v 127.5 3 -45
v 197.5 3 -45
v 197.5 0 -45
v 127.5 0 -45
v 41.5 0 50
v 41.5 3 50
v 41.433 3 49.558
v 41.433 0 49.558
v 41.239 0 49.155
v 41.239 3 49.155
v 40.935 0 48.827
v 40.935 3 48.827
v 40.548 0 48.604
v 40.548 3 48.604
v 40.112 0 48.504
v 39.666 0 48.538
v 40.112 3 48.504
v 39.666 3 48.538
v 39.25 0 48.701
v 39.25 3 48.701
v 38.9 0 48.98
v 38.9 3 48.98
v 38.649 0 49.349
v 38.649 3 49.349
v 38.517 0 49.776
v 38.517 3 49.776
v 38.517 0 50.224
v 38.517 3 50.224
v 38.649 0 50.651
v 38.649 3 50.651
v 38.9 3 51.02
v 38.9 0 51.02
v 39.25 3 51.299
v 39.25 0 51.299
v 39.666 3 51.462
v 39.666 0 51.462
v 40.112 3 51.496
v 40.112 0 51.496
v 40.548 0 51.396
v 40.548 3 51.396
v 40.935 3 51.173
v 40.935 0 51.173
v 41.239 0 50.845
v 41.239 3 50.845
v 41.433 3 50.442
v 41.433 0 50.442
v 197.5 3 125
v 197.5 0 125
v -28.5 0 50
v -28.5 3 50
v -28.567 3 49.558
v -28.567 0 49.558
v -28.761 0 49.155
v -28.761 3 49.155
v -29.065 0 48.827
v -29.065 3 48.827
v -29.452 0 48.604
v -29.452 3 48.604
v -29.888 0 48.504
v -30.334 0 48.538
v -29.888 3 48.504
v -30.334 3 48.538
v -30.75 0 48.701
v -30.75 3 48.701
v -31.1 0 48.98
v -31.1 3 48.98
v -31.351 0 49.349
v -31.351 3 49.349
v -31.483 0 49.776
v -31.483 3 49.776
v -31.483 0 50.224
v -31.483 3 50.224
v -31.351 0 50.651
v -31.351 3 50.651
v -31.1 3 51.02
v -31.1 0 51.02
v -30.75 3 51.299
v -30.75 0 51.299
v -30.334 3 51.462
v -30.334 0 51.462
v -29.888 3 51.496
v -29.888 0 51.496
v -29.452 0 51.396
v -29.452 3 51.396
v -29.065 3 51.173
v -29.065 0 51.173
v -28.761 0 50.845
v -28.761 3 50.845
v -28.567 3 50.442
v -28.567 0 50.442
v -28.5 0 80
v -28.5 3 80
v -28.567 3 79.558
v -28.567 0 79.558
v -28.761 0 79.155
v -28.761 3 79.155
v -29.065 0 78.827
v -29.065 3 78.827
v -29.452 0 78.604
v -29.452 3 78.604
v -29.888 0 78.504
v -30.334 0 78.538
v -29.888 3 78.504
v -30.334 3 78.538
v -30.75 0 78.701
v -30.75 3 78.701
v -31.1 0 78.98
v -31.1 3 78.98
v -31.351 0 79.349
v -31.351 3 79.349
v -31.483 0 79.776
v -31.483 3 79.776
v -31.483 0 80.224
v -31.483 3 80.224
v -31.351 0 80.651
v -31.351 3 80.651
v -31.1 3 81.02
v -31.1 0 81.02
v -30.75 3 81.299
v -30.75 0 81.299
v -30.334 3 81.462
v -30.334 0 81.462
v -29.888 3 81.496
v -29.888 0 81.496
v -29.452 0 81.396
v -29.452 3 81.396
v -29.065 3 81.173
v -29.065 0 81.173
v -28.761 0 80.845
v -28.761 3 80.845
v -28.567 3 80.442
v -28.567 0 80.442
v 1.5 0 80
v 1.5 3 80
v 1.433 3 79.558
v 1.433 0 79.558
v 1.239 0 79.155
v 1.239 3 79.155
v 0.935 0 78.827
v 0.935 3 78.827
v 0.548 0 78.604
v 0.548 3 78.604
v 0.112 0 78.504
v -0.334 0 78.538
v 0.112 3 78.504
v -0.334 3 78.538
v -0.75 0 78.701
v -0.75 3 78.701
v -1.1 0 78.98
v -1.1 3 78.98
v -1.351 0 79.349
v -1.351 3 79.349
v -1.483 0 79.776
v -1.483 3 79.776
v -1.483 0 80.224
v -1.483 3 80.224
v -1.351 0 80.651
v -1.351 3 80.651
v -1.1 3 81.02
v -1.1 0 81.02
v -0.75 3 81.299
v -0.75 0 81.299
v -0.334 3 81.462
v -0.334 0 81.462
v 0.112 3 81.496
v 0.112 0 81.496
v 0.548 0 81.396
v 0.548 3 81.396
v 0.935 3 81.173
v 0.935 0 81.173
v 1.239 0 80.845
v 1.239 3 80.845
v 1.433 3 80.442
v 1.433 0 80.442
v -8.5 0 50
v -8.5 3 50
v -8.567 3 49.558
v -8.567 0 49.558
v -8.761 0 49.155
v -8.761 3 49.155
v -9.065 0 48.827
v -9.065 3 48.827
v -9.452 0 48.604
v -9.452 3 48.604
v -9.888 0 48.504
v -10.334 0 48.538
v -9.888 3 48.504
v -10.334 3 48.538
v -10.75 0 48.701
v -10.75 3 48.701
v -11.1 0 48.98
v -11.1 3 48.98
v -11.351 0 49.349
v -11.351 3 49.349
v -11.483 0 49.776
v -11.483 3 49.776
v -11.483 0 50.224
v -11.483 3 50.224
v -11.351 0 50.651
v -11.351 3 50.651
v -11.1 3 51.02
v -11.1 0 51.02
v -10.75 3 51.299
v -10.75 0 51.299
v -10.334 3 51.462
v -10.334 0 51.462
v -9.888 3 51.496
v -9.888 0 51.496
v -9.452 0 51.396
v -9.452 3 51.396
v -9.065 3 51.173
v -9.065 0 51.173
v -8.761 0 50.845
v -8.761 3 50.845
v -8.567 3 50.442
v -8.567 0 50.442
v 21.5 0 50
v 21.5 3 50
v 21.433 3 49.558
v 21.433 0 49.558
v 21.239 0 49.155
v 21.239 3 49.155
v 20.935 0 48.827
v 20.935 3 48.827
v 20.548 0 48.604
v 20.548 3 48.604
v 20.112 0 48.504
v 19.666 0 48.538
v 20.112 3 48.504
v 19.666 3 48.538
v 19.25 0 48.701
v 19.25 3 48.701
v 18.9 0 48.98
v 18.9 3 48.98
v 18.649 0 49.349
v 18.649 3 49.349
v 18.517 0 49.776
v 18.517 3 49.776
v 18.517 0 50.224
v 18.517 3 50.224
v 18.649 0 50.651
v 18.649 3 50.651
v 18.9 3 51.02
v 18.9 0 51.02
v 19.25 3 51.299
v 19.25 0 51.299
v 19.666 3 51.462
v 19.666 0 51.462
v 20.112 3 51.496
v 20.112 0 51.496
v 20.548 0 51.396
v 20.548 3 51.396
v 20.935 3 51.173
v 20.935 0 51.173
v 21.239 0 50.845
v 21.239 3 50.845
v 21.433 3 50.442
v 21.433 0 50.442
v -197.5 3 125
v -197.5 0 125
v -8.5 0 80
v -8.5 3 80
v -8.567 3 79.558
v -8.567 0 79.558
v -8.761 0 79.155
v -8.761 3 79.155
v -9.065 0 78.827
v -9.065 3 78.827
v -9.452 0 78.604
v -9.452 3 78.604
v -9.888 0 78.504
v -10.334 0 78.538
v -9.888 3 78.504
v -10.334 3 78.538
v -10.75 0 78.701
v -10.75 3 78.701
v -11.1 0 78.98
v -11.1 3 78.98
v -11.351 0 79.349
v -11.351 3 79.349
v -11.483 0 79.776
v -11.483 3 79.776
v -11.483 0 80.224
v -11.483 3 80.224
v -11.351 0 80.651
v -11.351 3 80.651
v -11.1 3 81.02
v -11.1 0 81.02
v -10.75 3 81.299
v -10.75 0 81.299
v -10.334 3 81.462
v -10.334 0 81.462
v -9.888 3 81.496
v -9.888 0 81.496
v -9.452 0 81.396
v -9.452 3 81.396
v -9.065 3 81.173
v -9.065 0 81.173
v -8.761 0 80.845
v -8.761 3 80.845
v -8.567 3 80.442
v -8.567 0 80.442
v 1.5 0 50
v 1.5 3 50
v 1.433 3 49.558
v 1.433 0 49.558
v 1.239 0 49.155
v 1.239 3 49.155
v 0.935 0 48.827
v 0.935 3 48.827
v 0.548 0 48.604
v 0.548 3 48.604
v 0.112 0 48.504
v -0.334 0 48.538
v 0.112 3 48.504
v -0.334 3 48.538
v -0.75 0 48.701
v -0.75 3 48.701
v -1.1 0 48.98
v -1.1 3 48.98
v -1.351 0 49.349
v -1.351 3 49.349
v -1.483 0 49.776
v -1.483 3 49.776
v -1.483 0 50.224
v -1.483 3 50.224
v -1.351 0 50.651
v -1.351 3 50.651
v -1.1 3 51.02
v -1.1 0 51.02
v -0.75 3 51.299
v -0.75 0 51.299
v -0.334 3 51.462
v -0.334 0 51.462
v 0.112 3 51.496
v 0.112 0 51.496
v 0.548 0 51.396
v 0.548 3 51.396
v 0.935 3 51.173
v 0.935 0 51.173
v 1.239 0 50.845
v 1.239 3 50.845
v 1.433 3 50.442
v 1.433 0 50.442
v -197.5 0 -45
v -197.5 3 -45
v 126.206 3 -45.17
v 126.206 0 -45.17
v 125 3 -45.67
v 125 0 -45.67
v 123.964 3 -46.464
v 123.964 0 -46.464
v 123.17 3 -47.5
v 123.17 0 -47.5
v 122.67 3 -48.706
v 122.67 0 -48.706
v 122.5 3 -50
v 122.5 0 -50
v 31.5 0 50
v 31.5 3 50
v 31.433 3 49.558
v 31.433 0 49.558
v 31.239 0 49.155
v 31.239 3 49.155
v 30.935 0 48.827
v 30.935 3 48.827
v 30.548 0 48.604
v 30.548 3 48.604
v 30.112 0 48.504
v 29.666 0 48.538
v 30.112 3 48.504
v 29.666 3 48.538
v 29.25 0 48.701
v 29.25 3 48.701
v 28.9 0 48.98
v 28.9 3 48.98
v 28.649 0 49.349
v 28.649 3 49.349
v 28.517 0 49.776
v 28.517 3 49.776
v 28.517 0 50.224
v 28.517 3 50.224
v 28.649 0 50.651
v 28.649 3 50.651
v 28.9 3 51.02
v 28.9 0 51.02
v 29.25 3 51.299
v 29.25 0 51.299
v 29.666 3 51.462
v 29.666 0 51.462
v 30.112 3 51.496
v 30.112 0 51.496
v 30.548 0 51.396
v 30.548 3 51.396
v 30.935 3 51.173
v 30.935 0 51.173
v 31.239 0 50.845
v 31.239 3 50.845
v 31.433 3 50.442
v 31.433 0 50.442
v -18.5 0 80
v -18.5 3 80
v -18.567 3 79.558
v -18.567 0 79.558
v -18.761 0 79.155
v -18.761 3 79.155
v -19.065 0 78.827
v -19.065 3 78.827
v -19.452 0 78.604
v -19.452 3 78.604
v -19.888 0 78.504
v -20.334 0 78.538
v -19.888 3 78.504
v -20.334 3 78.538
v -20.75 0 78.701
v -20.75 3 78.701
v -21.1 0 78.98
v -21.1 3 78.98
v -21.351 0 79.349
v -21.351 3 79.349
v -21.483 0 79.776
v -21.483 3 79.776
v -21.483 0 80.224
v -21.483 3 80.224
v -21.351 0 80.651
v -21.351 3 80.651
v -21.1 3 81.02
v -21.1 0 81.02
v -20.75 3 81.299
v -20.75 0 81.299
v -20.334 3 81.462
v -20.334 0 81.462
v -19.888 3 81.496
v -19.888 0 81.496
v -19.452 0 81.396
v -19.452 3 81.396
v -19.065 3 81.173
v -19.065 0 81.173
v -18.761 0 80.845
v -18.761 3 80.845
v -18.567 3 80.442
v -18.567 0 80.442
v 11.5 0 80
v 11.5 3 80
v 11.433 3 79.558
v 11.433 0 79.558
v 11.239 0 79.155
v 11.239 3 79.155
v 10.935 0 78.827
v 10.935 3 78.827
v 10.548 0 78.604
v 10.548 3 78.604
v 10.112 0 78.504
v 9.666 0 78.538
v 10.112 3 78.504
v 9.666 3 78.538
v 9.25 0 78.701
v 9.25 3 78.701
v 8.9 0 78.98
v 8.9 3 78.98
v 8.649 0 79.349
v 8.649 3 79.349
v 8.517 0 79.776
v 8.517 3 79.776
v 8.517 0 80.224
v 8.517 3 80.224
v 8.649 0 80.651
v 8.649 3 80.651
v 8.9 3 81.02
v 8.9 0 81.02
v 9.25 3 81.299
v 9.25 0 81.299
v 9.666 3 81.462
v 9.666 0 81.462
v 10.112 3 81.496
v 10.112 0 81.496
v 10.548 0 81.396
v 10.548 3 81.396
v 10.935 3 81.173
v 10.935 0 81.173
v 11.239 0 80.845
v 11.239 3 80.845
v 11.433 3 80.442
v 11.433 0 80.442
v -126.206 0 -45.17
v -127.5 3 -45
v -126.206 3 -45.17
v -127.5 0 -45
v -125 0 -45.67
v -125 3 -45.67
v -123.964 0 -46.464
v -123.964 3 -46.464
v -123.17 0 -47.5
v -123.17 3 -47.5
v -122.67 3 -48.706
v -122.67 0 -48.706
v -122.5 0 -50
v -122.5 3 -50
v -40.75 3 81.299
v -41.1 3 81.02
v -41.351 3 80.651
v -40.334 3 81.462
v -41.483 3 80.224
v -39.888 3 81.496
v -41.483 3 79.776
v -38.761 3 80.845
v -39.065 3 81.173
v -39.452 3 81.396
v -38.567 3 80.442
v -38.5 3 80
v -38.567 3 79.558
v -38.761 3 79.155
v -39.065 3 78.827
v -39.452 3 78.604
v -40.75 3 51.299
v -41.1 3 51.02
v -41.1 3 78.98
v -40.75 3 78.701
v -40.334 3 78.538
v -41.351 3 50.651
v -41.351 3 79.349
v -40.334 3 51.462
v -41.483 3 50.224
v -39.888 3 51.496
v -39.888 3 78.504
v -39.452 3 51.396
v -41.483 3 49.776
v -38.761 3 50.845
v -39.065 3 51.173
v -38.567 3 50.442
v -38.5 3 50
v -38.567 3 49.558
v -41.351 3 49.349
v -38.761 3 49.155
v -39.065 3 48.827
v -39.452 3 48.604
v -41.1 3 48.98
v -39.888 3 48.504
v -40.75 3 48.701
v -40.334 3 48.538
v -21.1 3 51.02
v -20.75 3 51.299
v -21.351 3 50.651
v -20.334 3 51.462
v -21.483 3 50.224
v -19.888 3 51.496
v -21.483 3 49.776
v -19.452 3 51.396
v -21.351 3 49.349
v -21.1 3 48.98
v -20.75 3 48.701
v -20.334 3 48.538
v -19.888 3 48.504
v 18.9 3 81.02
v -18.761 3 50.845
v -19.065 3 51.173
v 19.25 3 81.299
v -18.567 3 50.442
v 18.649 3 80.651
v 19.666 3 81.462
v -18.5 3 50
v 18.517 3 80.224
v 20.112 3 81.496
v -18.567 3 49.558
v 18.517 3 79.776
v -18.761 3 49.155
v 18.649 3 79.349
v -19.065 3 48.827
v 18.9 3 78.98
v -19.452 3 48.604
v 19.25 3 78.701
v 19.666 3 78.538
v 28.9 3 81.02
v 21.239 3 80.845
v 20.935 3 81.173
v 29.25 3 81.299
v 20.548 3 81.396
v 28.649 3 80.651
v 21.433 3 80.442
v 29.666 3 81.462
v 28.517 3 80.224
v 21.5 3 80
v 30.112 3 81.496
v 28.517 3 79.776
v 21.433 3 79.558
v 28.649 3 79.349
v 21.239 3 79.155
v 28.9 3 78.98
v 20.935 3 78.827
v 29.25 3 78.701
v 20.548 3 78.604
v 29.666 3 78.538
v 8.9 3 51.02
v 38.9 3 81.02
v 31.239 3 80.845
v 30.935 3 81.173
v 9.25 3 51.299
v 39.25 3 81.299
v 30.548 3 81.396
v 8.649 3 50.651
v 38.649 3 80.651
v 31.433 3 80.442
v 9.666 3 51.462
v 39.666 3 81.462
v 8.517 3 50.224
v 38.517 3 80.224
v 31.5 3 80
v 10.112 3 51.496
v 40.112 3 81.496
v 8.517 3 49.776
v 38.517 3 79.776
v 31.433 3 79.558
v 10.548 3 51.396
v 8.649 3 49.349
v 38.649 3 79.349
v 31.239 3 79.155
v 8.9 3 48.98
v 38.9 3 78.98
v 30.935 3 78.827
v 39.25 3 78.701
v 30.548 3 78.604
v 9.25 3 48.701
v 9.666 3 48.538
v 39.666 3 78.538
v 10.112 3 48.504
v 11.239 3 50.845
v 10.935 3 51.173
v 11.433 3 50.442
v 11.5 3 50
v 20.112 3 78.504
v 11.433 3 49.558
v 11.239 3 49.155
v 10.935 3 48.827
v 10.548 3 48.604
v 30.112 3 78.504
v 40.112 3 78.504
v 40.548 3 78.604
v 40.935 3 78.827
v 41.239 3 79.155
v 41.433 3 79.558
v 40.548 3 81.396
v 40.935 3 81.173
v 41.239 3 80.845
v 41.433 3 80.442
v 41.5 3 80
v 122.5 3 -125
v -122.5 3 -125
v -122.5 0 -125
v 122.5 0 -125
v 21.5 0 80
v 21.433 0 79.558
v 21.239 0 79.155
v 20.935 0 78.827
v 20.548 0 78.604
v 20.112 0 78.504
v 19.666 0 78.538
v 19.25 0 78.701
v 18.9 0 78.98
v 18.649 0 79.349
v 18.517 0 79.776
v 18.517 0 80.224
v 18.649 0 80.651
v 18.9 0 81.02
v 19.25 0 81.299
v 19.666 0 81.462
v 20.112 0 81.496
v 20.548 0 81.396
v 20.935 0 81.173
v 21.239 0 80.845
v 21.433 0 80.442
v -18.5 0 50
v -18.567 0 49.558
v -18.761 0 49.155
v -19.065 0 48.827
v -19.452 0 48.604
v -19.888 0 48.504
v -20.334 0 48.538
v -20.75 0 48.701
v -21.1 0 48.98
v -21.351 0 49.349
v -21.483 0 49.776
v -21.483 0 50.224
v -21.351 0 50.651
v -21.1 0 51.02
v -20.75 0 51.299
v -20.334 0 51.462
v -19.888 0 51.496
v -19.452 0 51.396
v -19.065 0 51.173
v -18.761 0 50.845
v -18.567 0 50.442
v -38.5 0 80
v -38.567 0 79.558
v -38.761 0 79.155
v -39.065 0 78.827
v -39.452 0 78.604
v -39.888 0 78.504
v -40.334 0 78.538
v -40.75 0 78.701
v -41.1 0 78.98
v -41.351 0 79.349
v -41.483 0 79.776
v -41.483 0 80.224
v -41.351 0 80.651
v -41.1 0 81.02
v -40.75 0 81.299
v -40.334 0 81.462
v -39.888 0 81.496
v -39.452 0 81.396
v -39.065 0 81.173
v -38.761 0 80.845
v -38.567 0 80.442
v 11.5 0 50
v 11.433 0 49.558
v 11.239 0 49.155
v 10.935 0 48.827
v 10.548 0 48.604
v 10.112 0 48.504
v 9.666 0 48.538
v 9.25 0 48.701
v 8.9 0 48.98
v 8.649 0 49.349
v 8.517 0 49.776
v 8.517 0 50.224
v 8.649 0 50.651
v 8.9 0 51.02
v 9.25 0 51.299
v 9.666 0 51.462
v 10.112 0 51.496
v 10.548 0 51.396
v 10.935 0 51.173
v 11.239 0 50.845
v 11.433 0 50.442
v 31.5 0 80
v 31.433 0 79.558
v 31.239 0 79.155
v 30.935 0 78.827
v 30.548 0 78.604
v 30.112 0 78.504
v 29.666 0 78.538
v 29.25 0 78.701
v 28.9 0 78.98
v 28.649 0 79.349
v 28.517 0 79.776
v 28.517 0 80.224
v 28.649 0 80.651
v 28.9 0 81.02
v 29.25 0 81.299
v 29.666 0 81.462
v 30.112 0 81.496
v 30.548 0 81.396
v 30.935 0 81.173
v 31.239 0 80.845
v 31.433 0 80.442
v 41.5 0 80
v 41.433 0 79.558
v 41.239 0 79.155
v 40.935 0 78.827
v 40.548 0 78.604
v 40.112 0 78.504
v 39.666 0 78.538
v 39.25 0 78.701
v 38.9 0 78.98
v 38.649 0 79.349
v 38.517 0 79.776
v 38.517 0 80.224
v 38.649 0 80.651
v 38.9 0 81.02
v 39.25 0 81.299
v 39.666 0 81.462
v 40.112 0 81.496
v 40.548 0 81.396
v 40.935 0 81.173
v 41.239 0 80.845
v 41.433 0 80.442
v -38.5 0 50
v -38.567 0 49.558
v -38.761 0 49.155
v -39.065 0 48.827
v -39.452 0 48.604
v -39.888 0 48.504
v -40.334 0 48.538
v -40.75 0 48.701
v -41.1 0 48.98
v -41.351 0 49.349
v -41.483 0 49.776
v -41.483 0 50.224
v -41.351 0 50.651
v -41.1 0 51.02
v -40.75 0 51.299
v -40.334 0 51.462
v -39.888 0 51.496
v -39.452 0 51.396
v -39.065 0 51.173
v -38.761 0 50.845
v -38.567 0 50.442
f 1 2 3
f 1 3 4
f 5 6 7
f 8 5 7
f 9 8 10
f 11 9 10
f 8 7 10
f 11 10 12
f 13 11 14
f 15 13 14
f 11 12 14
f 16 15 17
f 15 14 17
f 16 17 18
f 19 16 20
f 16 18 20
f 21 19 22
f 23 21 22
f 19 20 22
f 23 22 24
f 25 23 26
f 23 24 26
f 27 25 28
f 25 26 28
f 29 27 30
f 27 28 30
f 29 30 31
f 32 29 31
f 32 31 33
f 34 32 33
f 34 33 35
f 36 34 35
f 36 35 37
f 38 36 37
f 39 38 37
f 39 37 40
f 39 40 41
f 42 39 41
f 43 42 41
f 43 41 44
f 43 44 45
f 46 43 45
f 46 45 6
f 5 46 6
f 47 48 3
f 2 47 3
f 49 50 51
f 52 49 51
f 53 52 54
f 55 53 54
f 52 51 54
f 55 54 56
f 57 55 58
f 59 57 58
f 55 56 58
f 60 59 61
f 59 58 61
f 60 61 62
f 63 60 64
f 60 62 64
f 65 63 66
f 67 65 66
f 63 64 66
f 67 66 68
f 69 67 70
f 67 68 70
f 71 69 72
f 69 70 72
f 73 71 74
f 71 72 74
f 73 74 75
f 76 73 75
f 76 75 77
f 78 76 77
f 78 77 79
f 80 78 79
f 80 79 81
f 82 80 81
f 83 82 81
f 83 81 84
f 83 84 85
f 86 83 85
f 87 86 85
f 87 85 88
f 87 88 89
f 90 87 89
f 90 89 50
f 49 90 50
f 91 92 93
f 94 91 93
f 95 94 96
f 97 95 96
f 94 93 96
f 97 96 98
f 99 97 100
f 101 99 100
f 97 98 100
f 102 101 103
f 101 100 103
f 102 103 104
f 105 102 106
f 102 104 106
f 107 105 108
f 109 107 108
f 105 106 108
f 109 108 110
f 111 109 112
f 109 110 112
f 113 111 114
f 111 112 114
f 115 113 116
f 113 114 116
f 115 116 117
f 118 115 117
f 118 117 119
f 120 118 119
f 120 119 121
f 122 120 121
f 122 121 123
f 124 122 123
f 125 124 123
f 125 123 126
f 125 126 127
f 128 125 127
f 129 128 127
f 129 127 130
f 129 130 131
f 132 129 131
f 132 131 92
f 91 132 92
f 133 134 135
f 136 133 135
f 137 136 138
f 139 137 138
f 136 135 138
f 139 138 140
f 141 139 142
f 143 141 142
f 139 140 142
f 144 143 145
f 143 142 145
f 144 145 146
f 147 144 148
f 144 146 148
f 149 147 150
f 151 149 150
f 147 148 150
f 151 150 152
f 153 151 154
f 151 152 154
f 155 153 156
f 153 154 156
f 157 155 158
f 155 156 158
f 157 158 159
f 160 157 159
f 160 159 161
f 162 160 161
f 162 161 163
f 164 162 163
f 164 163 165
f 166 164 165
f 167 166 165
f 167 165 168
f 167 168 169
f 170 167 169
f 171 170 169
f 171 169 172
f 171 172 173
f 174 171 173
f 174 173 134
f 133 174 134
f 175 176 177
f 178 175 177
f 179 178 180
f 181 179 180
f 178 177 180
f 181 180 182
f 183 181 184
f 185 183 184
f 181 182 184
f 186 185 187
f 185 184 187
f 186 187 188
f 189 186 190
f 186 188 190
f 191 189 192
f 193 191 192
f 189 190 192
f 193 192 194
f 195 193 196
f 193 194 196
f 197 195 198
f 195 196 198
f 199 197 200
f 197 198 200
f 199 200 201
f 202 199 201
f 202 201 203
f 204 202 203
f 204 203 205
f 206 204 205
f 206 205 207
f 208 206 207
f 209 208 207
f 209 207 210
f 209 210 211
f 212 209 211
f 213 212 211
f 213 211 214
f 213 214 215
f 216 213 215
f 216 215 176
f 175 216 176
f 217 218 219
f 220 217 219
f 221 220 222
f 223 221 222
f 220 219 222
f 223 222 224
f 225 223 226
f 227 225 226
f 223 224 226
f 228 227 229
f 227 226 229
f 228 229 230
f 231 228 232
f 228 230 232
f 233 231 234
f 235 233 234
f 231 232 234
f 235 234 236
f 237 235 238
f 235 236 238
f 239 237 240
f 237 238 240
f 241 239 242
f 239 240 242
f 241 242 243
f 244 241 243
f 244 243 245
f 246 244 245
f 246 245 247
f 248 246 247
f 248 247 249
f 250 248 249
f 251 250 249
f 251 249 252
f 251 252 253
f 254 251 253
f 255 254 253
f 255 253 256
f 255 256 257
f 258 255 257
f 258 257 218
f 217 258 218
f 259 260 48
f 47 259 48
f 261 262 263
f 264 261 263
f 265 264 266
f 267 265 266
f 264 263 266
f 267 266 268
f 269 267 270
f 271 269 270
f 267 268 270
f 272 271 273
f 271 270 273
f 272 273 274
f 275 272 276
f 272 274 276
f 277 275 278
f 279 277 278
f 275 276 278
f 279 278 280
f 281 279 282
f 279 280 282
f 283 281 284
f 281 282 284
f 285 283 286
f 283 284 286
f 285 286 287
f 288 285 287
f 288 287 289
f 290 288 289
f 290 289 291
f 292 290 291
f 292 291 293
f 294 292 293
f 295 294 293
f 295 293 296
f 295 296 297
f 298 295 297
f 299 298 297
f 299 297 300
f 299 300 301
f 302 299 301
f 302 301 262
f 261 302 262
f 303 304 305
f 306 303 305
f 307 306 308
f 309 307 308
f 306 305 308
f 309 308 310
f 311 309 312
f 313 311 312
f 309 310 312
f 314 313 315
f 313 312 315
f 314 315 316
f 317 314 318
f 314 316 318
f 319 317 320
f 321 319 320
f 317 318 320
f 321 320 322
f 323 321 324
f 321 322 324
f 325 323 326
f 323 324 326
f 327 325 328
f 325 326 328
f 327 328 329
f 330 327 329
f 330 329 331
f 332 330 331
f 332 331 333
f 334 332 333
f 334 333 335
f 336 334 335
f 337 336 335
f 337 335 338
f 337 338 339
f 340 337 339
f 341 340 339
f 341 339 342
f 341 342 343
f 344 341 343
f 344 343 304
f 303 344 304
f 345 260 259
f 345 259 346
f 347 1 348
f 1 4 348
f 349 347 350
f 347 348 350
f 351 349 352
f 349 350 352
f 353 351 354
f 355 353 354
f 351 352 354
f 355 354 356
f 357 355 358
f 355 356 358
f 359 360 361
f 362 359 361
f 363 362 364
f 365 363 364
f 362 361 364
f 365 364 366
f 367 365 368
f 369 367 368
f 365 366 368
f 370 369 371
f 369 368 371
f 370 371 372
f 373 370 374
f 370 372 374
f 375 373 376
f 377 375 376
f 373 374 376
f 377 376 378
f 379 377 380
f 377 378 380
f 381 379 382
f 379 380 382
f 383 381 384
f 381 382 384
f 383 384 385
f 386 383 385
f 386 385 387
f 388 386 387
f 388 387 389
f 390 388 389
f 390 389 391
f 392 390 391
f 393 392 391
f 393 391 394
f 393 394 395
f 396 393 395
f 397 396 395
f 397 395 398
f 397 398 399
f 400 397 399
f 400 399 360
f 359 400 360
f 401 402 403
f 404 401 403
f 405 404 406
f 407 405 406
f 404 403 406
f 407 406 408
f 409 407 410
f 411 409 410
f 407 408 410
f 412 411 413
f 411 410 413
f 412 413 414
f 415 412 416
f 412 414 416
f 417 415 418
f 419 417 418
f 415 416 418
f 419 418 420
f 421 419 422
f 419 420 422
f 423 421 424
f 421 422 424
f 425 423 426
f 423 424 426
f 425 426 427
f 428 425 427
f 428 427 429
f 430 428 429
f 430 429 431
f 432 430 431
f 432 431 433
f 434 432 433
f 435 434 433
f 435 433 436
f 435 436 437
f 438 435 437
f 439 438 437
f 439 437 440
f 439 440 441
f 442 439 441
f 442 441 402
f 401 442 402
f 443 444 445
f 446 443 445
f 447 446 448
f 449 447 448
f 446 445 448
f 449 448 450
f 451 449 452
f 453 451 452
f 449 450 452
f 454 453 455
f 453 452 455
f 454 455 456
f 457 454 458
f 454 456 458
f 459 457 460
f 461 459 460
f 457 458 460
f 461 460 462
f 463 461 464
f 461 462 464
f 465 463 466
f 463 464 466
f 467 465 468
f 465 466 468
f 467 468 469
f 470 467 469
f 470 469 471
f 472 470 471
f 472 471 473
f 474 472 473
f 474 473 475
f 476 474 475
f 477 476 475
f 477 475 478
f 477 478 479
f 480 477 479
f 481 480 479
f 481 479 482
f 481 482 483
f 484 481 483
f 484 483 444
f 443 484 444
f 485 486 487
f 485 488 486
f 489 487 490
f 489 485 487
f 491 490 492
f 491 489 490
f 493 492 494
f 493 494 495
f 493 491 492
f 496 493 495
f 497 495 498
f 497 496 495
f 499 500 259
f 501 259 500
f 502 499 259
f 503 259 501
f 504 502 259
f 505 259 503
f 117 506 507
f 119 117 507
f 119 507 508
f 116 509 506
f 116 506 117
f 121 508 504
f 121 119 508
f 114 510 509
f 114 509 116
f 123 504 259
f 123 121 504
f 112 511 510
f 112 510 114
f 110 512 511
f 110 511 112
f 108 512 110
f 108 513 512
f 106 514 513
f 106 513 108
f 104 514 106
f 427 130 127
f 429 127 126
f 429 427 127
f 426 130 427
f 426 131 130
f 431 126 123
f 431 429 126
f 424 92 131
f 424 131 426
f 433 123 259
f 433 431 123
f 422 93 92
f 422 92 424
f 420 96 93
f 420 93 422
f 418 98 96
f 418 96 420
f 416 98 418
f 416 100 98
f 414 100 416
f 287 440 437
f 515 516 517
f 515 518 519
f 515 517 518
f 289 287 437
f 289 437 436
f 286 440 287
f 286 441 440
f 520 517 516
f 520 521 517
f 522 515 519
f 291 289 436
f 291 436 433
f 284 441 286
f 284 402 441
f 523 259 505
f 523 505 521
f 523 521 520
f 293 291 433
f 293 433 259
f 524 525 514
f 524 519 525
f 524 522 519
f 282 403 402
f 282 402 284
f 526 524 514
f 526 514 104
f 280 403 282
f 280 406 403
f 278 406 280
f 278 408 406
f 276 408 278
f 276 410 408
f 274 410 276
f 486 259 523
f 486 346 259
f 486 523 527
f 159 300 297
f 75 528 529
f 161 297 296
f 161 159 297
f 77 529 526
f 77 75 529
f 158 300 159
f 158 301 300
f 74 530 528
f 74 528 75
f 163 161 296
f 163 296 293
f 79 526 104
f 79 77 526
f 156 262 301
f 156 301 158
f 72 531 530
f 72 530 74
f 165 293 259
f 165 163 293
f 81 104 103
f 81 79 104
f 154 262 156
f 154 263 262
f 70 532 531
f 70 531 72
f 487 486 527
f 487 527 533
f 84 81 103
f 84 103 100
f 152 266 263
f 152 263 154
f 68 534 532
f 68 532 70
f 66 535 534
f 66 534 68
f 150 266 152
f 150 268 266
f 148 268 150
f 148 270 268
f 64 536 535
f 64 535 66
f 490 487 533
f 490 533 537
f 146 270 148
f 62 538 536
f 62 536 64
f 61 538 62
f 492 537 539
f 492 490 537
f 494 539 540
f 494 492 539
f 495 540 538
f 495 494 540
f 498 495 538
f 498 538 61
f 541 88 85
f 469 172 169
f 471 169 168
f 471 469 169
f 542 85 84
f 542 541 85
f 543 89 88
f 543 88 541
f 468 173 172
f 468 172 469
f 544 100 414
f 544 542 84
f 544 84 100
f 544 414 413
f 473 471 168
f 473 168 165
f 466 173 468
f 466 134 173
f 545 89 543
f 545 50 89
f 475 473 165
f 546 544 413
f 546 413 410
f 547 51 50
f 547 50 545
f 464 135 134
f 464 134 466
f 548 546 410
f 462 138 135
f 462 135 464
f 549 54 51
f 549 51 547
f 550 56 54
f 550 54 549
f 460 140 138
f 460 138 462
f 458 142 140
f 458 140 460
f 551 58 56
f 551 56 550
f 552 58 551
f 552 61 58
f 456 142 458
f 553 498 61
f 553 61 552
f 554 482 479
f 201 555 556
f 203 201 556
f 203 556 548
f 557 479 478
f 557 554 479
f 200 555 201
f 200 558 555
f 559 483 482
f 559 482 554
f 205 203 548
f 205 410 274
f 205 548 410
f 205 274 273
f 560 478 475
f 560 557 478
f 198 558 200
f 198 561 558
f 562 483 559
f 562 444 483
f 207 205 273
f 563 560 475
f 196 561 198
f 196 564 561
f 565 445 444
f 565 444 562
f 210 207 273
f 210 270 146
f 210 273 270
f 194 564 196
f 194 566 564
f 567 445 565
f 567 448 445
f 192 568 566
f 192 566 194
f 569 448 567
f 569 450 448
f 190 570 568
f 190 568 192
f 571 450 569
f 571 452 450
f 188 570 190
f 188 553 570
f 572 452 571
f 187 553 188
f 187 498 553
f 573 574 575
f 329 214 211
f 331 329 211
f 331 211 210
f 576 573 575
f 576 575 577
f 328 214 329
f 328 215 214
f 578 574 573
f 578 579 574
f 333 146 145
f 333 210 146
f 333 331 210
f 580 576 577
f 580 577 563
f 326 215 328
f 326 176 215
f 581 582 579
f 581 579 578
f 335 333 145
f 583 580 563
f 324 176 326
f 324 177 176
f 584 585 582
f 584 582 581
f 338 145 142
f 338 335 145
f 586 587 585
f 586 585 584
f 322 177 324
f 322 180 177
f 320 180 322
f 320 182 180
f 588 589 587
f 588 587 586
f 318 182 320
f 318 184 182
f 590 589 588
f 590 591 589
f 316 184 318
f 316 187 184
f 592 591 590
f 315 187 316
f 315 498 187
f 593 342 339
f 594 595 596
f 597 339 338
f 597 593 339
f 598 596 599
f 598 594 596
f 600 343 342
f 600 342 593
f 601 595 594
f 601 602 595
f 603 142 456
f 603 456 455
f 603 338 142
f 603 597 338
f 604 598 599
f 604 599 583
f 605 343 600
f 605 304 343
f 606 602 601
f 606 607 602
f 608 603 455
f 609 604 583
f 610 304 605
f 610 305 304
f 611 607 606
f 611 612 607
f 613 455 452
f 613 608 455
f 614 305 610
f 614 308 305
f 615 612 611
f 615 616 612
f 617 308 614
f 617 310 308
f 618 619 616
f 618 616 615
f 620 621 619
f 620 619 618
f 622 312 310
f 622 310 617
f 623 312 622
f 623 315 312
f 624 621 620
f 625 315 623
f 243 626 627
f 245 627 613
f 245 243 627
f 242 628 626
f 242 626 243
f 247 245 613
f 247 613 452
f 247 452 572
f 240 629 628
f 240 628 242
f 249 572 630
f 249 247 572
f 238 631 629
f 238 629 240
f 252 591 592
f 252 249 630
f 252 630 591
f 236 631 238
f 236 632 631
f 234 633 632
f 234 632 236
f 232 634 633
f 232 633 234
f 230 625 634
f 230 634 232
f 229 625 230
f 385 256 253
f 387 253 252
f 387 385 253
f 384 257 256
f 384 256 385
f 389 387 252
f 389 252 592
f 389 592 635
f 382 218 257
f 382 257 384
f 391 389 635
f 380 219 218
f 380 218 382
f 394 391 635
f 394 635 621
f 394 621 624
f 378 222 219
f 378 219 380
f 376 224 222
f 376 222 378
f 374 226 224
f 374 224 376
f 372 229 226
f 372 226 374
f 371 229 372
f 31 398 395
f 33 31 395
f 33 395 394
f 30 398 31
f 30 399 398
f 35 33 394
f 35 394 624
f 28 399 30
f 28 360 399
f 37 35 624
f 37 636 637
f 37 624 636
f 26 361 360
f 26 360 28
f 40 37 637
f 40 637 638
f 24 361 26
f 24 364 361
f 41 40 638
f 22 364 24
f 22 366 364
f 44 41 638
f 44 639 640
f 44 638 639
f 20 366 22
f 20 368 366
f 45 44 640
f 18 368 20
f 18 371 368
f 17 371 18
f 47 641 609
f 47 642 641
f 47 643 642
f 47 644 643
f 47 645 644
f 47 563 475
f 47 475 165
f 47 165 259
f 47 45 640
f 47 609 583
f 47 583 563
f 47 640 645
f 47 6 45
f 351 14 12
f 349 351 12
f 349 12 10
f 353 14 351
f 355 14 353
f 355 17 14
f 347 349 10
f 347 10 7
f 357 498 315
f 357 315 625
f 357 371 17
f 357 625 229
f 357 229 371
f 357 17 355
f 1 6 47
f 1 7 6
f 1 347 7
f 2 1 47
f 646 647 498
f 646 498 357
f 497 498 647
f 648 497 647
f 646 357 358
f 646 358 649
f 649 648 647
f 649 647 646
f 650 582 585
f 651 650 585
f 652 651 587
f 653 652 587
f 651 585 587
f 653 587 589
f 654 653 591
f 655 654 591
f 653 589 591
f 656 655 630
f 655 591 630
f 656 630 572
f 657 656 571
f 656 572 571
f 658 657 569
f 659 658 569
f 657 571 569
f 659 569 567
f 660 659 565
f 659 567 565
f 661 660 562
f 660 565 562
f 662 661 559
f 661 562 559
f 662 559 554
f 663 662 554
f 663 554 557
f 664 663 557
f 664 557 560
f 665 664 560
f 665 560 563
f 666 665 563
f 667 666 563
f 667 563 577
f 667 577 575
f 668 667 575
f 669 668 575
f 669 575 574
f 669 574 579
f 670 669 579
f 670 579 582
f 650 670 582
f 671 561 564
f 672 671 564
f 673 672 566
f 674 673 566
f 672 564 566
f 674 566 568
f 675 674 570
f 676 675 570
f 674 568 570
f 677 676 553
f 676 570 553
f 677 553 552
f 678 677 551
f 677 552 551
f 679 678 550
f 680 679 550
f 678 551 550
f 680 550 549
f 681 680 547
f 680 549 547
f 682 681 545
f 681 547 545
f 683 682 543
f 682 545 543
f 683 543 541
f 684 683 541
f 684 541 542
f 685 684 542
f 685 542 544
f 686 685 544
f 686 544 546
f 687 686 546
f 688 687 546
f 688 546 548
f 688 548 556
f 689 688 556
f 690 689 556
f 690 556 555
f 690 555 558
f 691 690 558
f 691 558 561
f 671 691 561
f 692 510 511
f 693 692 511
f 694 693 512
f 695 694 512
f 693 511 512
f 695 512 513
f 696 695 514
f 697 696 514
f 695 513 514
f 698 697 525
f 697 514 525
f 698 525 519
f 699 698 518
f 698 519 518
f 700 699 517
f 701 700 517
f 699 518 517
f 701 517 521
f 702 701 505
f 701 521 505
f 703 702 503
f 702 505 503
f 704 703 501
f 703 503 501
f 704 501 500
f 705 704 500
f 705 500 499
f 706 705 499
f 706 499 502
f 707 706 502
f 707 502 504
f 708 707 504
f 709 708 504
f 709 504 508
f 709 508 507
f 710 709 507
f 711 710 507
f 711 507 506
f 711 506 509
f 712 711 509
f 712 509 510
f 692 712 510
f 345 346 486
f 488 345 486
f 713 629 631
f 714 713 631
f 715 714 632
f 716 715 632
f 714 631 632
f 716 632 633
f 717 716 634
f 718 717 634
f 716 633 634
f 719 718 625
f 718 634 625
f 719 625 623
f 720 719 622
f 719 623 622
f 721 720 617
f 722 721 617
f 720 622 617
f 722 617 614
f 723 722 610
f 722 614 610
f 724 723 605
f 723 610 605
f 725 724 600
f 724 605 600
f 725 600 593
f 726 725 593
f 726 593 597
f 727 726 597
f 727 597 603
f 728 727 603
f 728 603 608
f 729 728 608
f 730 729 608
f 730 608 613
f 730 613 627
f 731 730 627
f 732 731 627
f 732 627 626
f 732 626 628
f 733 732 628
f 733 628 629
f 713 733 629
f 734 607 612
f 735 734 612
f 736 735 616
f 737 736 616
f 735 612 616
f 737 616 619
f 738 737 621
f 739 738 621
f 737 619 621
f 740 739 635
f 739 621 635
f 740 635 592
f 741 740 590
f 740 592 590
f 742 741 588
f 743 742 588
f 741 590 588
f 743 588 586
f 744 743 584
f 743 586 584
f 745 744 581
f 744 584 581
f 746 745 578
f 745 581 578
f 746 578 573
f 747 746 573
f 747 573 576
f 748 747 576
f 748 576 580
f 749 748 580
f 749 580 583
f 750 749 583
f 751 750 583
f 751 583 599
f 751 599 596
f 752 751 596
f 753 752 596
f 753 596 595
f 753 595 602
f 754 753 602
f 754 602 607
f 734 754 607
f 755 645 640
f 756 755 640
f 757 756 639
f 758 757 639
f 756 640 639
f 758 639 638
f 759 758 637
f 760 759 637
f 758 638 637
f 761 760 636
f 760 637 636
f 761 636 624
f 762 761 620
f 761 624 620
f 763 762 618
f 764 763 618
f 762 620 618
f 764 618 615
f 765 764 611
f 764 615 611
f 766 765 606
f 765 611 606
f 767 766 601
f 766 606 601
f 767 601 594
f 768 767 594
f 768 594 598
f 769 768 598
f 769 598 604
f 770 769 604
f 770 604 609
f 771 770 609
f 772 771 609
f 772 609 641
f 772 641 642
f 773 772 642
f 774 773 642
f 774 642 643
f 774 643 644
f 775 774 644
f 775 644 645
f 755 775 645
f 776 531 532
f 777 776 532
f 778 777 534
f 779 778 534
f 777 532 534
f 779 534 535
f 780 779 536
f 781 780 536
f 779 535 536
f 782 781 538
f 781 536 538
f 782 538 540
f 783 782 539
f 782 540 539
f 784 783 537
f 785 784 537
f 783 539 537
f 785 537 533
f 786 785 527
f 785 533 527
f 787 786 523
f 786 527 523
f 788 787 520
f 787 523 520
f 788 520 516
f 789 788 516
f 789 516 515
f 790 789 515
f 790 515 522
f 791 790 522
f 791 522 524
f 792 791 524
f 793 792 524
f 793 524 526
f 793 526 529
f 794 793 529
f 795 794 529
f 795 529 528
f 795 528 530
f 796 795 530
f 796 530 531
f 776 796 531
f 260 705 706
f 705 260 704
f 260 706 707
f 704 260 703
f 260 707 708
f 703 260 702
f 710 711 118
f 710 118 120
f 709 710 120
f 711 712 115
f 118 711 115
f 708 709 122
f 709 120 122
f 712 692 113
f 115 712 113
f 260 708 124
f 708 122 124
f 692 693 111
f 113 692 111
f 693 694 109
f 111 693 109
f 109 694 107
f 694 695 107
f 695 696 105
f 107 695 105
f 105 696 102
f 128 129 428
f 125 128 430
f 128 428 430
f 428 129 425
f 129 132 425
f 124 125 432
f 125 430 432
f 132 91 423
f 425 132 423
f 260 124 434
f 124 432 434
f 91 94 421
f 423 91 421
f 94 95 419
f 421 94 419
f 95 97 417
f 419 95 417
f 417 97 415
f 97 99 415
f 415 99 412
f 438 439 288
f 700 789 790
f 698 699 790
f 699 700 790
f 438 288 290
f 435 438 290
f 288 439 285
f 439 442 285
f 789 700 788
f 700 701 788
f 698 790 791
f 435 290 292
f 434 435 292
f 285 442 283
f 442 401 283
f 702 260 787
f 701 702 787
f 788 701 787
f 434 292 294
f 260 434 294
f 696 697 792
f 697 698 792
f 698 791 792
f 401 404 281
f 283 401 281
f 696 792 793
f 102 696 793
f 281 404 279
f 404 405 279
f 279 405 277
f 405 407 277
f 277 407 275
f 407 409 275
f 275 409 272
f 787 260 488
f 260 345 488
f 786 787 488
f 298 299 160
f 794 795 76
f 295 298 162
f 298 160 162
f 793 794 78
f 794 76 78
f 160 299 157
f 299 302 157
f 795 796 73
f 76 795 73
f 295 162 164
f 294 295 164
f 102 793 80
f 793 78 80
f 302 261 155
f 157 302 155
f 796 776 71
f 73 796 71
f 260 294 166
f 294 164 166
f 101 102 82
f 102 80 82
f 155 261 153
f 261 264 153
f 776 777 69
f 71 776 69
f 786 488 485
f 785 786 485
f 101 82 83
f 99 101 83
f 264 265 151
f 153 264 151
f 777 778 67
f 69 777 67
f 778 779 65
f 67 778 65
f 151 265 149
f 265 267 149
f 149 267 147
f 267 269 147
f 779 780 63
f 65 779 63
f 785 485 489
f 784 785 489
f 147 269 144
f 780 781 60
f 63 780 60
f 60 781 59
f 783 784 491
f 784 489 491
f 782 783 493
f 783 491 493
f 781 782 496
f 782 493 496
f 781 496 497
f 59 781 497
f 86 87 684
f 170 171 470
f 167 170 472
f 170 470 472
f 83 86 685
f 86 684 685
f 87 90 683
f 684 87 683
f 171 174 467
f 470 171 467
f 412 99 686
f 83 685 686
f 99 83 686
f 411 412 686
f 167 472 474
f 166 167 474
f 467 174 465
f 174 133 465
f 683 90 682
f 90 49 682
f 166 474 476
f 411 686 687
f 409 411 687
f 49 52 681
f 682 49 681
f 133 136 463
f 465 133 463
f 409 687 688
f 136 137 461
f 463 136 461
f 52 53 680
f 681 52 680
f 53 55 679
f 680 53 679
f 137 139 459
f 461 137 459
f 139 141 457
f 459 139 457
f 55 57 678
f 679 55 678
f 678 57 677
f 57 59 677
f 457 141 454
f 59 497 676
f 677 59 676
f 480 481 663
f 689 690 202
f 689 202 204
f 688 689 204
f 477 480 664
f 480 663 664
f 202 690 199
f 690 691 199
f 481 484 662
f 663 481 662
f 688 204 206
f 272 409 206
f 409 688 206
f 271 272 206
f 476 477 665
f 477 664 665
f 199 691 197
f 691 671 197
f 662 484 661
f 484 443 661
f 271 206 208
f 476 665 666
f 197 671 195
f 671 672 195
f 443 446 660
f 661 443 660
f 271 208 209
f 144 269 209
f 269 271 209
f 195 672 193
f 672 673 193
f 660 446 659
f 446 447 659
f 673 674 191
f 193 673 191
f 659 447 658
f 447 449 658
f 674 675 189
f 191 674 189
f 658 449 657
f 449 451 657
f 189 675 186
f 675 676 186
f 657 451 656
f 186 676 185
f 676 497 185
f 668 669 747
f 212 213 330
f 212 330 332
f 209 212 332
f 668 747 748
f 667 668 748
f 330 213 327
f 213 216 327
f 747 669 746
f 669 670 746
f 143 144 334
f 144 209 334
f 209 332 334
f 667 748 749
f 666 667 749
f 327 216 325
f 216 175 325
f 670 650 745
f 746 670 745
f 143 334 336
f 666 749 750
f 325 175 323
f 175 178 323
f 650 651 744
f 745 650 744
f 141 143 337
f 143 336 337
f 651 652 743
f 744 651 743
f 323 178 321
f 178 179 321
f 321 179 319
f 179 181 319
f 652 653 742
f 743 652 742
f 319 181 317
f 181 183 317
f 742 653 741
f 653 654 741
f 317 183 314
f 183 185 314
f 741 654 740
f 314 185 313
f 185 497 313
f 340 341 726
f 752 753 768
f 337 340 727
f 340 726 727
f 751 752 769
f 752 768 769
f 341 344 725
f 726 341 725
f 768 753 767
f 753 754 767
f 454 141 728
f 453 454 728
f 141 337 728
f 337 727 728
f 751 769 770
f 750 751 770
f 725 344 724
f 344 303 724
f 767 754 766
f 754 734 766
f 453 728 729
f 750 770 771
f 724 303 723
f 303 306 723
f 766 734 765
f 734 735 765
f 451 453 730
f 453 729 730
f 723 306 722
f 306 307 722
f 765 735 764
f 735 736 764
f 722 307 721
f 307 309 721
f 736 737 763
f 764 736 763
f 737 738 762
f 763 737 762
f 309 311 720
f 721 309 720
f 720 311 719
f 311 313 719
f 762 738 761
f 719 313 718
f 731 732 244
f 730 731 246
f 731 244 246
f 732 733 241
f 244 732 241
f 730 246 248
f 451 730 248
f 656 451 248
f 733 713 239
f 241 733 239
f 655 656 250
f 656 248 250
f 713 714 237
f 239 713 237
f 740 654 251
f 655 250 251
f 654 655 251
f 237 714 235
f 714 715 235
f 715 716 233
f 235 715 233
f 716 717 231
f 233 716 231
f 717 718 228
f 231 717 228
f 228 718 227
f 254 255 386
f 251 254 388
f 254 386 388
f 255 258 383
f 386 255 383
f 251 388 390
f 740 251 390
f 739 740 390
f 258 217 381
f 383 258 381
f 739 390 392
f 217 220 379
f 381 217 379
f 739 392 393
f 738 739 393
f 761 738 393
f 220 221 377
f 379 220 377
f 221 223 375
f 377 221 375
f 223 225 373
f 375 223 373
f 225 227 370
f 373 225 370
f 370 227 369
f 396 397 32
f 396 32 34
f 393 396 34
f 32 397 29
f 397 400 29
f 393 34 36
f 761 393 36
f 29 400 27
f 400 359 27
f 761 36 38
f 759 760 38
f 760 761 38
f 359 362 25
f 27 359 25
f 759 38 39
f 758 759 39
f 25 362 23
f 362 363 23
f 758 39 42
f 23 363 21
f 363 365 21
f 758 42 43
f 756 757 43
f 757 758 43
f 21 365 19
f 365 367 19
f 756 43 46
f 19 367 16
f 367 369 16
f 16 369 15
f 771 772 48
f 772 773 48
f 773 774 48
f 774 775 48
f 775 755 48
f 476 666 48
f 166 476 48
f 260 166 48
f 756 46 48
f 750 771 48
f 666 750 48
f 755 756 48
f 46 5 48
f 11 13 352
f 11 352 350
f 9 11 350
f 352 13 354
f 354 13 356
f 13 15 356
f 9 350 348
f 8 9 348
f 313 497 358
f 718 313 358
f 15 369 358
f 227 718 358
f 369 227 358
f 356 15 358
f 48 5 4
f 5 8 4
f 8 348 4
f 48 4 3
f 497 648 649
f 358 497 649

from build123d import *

# Parameters (mm, degrees)
SKETCH1_W           = 395
SKETCH1_H           = 250
BOSS_EXTRUDE1_DEPTH = 3
SKETCH2_W           = 75
SKETCH2_H           = 80
CUT_EXTRUDE1_DEPTH  = 3
SKETCH3_R           = 1.5
CUT_EXTRUDE2_DEPTH  = 10
FILLET1_R           = 5
LPATTERN1_COUNT     = 5
LPATTERN1_PITCH     = 10
LPATTERN1_COL_COUNT = 5
LPATTERN1_COL_PITCH = 10


with BuildPart() as part:
    # Sketch1 → Boss-Extrude1 (new body)
    with BuildSketch(Plane(origin=(0, 0, 0), x_dir=(1, 0, 0), z_dir=(0, 1, 0))):
        Rectangle(SKETCH1_W, SKETCH1_H)
    extrude(amount=BOSS_EXTRUDE1_DEPTH)

    # Sketch2 → Cut-Extrude1 (cut)
    with BuildSketch(Plane(origin=(0, 3, 0), x_dir=(1, 0, 0), z_dir=(0, 1, 0))):
        with Locations((-160, 85)):
            Rectangle(SKETCH2_W, SKETCH2_H)
    cut_extrude1 = extrude(amount=-CUT_EXTRUDE1_DEPTH, mode=Mode.SUBTRACT)

    # Mirror1: Cut-Extrude1 across plane
    add(cut_extrude1.mirror(Plane(origin=(0, 0, 0), x_dir=(0, 0, 1), z_dir=(1, 0, 0))), mode=Mode.SUBTRACT)

    # Sketch3 → Cut-Extrude2 (cut)
    with BuildSketch(Plane(origin=(0, 3, 0), x_dir=(1, 0, 0), z_dir=(0, 1, 0))):
        with Locations((0, -50)):
            Circle(SKETCH3_R)
        with Locations((0, -80)):
            Circle(SKETCH3_R)
    cut_extrude2 = extrude(amount=-CUT_EXTRUDE2_DEPTH, mode=Mode.SUBTRACT)

    # Fillet1
    fillet1_edges = [part.edges().sort_by_distance(p)[0] for p in [
        (-122.5, 1.5, -45),
        (122.5, 1.5, -45),
    ]]
    fillet(fillet1_edges, radius=FILLET1_R)

    # LPattern1: Cut-Extrude2 ×5
    with Locations(*[(-i * LPATTERN1_PITCH, 0, 0) for i in range(1, LPATTERN1_COUNT)]):
        add(cut_extrude2, mode=Mode.SUBTRACT)

    # LPattern1 col: Cut-Extrude2 ×5
    with Locations(*[(i * LPATTERN1_COL_PITCH, 0, 0) for i in range(1, LPATTERN1_COL_COUNT)]):
        add(cut_extrude2, mode=Mode.SUBTRACT)


solid = part.part
